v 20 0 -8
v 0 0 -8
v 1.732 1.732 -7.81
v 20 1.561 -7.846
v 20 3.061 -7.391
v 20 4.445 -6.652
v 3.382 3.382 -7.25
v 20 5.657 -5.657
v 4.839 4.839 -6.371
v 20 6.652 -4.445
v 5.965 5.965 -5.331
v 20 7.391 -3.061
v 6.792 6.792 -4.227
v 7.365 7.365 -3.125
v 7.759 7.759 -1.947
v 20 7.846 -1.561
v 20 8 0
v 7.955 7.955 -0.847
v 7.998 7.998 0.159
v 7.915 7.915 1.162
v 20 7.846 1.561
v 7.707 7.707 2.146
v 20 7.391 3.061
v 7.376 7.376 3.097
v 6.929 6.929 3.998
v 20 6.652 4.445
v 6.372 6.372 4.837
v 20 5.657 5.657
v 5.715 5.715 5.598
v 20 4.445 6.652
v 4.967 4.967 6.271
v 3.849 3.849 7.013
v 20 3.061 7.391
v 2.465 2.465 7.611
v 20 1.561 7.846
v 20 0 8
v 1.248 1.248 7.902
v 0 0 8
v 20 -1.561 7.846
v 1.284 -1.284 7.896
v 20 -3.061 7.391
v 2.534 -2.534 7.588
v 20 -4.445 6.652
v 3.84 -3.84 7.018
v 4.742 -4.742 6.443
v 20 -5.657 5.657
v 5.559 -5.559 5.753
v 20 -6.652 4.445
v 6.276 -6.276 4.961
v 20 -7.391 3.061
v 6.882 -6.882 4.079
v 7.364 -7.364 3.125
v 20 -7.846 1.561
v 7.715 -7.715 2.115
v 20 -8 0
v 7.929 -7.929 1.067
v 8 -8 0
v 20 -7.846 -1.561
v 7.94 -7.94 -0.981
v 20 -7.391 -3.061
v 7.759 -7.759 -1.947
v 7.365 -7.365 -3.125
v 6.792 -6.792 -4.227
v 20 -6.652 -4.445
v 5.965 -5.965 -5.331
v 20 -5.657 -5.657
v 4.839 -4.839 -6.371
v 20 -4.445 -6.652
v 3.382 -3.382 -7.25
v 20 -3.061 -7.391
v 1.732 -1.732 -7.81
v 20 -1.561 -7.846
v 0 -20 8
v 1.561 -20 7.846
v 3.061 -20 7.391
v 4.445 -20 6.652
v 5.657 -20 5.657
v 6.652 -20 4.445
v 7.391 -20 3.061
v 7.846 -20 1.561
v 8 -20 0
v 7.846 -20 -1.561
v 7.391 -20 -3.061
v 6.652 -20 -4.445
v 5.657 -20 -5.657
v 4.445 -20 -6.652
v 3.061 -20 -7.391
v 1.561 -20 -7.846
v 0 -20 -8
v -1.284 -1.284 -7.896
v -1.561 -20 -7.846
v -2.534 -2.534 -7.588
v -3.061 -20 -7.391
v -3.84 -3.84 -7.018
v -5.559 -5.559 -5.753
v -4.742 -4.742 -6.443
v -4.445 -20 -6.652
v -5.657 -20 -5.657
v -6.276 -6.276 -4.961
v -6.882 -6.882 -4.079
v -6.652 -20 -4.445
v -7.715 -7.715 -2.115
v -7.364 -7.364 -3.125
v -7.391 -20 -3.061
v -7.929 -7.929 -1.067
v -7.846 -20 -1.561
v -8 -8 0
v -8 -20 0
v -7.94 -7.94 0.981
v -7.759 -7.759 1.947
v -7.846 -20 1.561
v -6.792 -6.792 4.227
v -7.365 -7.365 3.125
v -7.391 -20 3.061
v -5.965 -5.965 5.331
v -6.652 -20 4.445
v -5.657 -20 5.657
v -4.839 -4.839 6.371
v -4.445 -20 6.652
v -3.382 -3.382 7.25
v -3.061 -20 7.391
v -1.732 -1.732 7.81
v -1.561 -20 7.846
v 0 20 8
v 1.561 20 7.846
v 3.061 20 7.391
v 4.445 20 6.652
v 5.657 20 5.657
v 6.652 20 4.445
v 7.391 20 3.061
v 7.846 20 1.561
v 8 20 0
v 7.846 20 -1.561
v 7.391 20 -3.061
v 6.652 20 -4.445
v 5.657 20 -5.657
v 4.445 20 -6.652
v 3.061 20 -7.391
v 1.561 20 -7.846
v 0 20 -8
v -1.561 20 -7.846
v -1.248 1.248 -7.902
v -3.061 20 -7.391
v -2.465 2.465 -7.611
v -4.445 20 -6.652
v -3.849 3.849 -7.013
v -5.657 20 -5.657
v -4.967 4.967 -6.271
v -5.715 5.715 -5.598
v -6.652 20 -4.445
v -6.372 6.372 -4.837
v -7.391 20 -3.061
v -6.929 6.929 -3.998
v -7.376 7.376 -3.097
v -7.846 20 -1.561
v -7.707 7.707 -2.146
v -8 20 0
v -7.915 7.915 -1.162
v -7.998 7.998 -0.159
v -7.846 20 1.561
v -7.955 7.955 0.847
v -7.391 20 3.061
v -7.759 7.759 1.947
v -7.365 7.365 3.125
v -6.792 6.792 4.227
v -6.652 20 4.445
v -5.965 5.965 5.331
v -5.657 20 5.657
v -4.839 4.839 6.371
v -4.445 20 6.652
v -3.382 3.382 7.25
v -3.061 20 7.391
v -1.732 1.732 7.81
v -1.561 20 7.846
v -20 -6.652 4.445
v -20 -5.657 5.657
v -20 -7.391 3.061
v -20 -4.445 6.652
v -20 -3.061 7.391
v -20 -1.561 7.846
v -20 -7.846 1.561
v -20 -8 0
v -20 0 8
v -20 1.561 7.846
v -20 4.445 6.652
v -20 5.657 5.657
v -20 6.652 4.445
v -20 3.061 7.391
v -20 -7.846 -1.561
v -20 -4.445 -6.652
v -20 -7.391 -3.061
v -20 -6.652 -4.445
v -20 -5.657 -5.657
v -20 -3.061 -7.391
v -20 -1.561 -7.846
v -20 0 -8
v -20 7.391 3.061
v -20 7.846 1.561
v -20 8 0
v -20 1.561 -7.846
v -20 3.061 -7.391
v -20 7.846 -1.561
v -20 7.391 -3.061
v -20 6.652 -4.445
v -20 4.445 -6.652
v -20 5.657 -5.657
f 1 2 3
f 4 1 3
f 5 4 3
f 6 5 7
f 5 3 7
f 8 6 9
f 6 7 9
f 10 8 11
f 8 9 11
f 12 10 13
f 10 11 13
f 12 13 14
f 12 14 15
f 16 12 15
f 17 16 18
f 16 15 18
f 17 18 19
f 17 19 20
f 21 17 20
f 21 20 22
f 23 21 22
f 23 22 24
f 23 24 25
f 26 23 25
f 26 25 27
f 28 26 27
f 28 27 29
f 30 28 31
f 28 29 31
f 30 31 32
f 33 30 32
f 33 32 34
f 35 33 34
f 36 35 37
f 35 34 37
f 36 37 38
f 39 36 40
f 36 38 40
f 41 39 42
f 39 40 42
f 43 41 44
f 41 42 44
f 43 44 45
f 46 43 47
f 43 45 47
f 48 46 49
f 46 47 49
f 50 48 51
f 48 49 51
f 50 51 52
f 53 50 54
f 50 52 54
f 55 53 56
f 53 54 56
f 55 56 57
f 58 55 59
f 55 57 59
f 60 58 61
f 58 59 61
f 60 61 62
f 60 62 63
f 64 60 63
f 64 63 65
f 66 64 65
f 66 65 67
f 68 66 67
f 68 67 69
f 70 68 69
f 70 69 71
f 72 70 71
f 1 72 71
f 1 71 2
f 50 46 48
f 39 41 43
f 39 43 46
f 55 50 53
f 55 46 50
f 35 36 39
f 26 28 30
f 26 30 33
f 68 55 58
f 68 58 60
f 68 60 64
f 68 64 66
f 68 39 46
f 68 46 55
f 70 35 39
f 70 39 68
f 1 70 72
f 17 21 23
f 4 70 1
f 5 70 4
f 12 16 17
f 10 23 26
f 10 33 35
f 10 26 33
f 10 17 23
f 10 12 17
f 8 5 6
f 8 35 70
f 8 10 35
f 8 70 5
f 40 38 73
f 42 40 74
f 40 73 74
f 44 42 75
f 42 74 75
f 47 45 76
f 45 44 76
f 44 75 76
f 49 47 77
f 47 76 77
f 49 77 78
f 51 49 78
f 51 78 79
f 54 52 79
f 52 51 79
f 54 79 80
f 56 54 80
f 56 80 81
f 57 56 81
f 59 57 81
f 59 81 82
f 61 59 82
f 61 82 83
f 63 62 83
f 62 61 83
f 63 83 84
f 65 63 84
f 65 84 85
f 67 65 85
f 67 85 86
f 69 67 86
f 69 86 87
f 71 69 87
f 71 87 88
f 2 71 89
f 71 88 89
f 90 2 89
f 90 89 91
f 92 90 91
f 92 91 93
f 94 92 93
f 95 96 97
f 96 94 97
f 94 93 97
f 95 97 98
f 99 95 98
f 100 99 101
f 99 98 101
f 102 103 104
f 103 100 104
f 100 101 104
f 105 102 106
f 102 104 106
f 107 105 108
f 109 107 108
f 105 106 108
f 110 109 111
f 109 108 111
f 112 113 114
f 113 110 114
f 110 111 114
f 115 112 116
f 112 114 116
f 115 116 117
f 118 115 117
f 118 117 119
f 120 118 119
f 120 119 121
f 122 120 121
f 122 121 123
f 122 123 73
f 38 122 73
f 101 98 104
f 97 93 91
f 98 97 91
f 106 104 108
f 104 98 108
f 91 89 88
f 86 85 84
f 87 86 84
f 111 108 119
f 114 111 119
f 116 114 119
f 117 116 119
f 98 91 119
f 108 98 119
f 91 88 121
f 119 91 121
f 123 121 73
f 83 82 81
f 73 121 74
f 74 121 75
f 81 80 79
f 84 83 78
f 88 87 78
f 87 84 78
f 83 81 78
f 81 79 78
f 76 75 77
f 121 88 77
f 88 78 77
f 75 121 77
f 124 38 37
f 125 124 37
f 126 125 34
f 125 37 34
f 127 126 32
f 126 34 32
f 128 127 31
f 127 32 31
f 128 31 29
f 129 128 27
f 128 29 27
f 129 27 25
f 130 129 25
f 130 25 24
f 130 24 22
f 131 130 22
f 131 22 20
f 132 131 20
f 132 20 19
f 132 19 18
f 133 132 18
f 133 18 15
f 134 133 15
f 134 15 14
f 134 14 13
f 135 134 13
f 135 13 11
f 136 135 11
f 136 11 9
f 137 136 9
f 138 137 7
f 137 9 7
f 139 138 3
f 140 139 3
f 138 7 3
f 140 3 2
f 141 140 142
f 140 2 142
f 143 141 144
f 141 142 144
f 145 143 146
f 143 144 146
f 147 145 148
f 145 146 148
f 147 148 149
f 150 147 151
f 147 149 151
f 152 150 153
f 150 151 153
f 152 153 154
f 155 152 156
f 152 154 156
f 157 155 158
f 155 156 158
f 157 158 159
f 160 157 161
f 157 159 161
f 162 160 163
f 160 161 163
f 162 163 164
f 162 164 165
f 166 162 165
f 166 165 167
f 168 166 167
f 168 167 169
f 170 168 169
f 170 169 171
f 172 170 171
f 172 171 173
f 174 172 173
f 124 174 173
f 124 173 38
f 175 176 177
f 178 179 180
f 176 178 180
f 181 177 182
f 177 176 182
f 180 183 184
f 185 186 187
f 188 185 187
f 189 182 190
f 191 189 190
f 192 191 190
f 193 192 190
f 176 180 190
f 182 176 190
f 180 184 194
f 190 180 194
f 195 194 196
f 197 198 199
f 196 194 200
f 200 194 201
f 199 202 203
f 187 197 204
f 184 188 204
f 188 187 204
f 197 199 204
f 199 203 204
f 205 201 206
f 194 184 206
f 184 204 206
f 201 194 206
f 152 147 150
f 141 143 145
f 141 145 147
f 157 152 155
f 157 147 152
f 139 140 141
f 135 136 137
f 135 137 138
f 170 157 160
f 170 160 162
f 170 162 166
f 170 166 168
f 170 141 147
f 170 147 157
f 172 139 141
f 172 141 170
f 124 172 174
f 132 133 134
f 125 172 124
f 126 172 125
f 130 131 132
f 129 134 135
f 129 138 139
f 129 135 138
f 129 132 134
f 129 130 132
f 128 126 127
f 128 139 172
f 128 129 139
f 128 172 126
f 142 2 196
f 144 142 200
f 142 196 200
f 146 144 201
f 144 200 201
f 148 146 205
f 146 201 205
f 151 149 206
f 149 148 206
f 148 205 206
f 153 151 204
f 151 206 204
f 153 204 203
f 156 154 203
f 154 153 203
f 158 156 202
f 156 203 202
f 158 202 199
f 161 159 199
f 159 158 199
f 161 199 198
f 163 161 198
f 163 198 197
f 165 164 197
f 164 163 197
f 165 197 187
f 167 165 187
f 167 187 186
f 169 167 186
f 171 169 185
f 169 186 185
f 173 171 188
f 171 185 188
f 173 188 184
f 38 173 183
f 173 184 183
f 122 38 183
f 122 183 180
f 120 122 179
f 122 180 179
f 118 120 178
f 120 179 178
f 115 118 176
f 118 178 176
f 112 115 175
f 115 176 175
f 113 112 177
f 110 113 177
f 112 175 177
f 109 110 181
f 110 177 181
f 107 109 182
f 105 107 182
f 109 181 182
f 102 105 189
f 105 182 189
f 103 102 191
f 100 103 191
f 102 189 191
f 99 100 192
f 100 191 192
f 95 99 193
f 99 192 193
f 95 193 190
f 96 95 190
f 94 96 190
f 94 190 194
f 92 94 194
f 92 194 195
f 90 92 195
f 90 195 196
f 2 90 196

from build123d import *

# Parameters (mm, degrees)
BOSS_EXTRUDE1_DEPTH      = 20
BOSS_EXTRUDE1_DEPTH_BACK = 20
SKETCH1_R                = 8
BOSS_EXTRUDE2_DEPTH      = 20
BOSS_EXTRUDE2_DEPTH_BACK = 20
SKETCH3_R                = 8


with BuildPart() as part:
    # Sketch1 → Boss-Extrude1 (new, two sides: drawn at the far end of the back side and taken through both)
    with BuildSketch(Plane(origin=(0, 0, 0), x_dir=(1, 0, 0), z_dir=(0, 1, 0)).offset(-BOSS_EXTRUDE1_DEPTH_BACK)):
        Circle(SKETCH1_R)
    extrude(amount=BOSS_EXTRUDE1_DEPTH + BOSS_EXTRUDE1_DEPTH_BACK)

    # Sketch3 → Boss-Extrude2 (add, two sides: drawn at the far end of the back side and taken through both)
    with BuildSketch(Plane(origin=(0, 0, 0), x_dir=(0, 0, -1), z_dir=(1, 0, 0)).offset(-BOSS_EXTRUDE2_DEPTH_BACK)):
        Circle(SKETCH3_R)
    extrude(amount=BOSS_EXTRUDE2_DEPTH + BOSS_EXTRUDE2_DEPTH_BACK)


solid = part.part
